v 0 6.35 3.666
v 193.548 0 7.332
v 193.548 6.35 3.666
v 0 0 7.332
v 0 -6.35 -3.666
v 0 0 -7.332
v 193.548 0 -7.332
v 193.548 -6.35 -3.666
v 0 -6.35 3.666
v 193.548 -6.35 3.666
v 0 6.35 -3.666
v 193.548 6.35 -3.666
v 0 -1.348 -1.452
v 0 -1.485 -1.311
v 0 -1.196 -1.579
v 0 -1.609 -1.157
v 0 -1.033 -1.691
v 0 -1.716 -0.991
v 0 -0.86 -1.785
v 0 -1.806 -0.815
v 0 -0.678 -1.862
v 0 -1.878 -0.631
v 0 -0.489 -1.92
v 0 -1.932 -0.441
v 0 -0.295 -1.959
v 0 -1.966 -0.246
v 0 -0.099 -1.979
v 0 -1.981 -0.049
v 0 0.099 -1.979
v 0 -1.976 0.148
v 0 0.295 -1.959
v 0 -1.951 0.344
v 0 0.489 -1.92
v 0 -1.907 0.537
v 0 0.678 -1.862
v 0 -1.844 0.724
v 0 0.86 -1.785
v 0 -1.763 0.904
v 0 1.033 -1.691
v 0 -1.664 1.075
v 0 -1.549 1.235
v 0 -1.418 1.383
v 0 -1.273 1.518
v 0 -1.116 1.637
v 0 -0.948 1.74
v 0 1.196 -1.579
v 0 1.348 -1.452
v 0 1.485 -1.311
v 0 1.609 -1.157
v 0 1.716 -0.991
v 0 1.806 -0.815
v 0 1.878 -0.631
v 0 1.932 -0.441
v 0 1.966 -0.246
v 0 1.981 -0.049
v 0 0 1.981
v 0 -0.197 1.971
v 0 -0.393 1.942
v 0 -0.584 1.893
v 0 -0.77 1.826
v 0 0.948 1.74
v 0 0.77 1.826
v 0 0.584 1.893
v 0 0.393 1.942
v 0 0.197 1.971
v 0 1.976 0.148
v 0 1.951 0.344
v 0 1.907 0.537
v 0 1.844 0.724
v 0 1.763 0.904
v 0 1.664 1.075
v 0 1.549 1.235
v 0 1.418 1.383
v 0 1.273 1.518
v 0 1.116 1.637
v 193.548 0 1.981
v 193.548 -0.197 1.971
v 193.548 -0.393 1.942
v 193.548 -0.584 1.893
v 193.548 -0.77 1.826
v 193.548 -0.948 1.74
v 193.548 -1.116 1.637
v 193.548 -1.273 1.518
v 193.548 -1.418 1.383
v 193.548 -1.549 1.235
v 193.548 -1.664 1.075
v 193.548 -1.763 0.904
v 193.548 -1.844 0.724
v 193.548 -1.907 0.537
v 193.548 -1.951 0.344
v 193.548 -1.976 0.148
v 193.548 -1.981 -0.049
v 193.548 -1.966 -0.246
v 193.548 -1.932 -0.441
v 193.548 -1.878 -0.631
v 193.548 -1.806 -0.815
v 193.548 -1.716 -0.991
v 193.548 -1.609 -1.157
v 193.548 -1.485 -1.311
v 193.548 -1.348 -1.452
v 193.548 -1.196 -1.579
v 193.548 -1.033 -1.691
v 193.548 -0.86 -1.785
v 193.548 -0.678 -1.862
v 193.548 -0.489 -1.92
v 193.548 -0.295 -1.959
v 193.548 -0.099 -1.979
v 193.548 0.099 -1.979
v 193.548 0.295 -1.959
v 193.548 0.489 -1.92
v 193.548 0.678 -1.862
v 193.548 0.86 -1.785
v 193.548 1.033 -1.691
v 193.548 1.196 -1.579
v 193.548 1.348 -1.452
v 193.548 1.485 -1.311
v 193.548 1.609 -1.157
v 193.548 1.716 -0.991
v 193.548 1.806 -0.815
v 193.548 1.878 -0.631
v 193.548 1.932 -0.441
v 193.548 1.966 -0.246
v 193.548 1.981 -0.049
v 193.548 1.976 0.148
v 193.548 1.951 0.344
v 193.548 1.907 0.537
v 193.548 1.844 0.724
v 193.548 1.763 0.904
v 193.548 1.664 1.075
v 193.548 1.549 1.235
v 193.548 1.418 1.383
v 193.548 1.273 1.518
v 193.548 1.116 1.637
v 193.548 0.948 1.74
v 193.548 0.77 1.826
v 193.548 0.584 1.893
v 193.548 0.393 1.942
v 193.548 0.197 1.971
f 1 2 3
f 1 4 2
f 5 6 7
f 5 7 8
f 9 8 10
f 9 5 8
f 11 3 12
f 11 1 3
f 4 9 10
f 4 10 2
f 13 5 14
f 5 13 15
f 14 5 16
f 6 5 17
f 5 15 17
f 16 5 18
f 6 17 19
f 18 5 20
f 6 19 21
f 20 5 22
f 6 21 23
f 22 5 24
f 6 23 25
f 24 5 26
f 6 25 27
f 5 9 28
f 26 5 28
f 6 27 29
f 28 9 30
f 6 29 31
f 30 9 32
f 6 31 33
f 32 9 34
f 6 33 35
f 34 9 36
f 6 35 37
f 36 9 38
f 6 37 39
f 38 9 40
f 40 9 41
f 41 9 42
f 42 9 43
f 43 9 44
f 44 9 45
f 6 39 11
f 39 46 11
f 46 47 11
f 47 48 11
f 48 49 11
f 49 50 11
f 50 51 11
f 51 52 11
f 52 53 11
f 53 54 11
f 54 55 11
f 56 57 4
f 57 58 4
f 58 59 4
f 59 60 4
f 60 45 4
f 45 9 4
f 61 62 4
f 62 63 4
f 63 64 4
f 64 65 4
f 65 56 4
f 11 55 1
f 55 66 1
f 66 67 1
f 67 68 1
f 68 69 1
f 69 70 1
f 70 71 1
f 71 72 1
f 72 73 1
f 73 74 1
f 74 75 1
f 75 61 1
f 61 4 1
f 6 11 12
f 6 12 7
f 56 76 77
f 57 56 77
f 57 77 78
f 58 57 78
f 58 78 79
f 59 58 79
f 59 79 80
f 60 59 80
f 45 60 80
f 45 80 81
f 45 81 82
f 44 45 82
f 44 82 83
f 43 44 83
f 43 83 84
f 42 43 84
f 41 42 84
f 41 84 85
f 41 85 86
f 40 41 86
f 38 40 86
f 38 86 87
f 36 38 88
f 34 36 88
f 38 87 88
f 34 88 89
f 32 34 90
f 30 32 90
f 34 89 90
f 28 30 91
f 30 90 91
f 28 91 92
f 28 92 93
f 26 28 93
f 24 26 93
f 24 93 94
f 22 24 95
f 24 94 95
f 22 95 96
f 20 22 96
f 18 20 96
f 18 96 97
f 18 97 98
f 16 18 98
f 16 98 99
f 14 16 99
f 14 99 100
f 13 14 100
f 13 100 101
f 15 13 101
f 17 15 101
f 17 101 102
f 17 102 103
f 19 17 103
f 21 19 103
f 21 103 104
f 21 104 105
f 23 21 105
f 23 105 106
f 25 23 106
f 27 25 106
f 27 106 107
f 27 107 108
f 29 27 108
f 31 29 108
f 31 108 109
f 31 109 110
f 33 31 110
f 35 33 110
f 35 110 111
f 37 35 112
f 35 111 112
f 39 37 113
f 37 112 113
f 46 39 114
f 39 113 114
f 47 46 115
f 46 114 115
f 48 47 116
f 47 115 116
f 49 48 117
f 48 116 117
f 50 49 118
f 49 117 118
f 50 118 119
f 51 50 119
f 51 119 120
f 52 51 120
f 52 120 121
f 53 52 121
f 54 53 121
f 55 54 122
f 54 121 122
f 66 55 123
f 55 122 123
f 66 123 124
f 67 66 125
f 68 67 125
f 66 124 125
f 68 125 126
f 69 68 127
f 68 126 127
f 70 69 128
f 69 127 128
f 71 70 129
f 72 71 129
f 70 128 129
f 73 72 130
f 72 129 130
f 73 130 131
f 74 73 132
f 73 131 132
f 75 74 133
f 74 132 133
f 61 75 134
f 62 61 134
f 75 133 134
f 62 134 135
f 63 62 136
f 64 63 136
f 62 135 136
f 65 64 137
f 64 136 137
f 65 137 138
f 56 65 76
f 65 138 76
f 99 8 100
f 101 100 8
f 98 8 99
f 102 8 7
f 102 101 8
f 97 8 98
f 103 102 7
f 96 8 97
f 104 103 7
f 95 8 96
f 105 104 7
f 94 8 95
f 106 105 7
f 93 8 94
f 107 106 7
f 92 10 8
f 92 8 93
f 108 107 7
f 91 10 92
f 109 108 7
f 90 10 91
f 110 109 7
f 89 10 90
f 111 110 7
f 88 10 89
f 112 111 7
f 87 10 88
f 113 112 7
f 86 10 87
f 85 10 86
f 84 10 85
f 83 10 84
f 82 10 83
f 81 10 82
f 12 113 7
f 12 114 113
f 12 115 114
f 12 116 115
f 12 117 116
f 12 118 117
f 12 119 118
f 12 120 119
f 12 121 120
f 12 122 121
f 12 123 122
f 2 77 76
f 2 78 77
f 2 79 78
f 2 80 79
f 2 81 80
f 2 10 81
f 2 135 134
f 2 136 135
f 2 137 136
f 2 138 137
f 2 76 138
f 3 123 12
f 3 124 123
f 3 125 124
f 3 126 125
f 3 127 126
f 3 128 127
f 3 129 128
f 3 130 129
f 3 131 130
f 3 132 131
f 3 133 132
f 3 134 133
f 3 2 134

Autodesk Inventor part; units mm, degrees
ref_plane "YZ Plane" through (0, 0, 0) normal (1, 0, 0) x (0, 1, 0)
ref_plane "XZ Plane" through (0, 0, 0) normal (0, 1, 0) x (-1, 0, 0)
ref_plane "XY Plane" through (0, 0, 0) normal (0, 0, 1) x (1, 0, 0)
sketch "Sketch1" plane through (0, 0, 0) normal (1, 0, 0) x (0, 1, 0)
  line L0 (-6.35, -3.6662) -> (-6.35, 3.6662)
  line L1 (-6.35, 3.6662) -> (0, 7.3323)
  line L2 (0, 7.3323) -> (6.35, 3.6662)
  line L3 (6.35, 3.6662) -> (6.35, -3.6662)
  line L4 (6.35, -3.6662) -> (0, -7.3323)
  line L5 (0, -7.3323) -> (-6.35, -3.6662)
  point P0 (0, 0)
  point P1 (0, 0)
  dimension "d0" = 12.7
extrude "Extrusion1" add sketch "Sketch1" along normal blind 193.548
sketch "Sketch2" plane through (0, 0, 0) normal (-1, 0, 0) x (0, 0, 1)
  point P0 (0, 0)
  point P1 (0, 0)
hole "Hole1" at (0, 0, 0) direction (1, 0, 0) diameter 3.9624 end through all thread size "10-32 UNF" class "2B" standard "ANSI Unified Screw Threads"
properties part number "STOCK,SHAFT,HEX,HOOD,WHEELS" material "Aluminum 6061"
